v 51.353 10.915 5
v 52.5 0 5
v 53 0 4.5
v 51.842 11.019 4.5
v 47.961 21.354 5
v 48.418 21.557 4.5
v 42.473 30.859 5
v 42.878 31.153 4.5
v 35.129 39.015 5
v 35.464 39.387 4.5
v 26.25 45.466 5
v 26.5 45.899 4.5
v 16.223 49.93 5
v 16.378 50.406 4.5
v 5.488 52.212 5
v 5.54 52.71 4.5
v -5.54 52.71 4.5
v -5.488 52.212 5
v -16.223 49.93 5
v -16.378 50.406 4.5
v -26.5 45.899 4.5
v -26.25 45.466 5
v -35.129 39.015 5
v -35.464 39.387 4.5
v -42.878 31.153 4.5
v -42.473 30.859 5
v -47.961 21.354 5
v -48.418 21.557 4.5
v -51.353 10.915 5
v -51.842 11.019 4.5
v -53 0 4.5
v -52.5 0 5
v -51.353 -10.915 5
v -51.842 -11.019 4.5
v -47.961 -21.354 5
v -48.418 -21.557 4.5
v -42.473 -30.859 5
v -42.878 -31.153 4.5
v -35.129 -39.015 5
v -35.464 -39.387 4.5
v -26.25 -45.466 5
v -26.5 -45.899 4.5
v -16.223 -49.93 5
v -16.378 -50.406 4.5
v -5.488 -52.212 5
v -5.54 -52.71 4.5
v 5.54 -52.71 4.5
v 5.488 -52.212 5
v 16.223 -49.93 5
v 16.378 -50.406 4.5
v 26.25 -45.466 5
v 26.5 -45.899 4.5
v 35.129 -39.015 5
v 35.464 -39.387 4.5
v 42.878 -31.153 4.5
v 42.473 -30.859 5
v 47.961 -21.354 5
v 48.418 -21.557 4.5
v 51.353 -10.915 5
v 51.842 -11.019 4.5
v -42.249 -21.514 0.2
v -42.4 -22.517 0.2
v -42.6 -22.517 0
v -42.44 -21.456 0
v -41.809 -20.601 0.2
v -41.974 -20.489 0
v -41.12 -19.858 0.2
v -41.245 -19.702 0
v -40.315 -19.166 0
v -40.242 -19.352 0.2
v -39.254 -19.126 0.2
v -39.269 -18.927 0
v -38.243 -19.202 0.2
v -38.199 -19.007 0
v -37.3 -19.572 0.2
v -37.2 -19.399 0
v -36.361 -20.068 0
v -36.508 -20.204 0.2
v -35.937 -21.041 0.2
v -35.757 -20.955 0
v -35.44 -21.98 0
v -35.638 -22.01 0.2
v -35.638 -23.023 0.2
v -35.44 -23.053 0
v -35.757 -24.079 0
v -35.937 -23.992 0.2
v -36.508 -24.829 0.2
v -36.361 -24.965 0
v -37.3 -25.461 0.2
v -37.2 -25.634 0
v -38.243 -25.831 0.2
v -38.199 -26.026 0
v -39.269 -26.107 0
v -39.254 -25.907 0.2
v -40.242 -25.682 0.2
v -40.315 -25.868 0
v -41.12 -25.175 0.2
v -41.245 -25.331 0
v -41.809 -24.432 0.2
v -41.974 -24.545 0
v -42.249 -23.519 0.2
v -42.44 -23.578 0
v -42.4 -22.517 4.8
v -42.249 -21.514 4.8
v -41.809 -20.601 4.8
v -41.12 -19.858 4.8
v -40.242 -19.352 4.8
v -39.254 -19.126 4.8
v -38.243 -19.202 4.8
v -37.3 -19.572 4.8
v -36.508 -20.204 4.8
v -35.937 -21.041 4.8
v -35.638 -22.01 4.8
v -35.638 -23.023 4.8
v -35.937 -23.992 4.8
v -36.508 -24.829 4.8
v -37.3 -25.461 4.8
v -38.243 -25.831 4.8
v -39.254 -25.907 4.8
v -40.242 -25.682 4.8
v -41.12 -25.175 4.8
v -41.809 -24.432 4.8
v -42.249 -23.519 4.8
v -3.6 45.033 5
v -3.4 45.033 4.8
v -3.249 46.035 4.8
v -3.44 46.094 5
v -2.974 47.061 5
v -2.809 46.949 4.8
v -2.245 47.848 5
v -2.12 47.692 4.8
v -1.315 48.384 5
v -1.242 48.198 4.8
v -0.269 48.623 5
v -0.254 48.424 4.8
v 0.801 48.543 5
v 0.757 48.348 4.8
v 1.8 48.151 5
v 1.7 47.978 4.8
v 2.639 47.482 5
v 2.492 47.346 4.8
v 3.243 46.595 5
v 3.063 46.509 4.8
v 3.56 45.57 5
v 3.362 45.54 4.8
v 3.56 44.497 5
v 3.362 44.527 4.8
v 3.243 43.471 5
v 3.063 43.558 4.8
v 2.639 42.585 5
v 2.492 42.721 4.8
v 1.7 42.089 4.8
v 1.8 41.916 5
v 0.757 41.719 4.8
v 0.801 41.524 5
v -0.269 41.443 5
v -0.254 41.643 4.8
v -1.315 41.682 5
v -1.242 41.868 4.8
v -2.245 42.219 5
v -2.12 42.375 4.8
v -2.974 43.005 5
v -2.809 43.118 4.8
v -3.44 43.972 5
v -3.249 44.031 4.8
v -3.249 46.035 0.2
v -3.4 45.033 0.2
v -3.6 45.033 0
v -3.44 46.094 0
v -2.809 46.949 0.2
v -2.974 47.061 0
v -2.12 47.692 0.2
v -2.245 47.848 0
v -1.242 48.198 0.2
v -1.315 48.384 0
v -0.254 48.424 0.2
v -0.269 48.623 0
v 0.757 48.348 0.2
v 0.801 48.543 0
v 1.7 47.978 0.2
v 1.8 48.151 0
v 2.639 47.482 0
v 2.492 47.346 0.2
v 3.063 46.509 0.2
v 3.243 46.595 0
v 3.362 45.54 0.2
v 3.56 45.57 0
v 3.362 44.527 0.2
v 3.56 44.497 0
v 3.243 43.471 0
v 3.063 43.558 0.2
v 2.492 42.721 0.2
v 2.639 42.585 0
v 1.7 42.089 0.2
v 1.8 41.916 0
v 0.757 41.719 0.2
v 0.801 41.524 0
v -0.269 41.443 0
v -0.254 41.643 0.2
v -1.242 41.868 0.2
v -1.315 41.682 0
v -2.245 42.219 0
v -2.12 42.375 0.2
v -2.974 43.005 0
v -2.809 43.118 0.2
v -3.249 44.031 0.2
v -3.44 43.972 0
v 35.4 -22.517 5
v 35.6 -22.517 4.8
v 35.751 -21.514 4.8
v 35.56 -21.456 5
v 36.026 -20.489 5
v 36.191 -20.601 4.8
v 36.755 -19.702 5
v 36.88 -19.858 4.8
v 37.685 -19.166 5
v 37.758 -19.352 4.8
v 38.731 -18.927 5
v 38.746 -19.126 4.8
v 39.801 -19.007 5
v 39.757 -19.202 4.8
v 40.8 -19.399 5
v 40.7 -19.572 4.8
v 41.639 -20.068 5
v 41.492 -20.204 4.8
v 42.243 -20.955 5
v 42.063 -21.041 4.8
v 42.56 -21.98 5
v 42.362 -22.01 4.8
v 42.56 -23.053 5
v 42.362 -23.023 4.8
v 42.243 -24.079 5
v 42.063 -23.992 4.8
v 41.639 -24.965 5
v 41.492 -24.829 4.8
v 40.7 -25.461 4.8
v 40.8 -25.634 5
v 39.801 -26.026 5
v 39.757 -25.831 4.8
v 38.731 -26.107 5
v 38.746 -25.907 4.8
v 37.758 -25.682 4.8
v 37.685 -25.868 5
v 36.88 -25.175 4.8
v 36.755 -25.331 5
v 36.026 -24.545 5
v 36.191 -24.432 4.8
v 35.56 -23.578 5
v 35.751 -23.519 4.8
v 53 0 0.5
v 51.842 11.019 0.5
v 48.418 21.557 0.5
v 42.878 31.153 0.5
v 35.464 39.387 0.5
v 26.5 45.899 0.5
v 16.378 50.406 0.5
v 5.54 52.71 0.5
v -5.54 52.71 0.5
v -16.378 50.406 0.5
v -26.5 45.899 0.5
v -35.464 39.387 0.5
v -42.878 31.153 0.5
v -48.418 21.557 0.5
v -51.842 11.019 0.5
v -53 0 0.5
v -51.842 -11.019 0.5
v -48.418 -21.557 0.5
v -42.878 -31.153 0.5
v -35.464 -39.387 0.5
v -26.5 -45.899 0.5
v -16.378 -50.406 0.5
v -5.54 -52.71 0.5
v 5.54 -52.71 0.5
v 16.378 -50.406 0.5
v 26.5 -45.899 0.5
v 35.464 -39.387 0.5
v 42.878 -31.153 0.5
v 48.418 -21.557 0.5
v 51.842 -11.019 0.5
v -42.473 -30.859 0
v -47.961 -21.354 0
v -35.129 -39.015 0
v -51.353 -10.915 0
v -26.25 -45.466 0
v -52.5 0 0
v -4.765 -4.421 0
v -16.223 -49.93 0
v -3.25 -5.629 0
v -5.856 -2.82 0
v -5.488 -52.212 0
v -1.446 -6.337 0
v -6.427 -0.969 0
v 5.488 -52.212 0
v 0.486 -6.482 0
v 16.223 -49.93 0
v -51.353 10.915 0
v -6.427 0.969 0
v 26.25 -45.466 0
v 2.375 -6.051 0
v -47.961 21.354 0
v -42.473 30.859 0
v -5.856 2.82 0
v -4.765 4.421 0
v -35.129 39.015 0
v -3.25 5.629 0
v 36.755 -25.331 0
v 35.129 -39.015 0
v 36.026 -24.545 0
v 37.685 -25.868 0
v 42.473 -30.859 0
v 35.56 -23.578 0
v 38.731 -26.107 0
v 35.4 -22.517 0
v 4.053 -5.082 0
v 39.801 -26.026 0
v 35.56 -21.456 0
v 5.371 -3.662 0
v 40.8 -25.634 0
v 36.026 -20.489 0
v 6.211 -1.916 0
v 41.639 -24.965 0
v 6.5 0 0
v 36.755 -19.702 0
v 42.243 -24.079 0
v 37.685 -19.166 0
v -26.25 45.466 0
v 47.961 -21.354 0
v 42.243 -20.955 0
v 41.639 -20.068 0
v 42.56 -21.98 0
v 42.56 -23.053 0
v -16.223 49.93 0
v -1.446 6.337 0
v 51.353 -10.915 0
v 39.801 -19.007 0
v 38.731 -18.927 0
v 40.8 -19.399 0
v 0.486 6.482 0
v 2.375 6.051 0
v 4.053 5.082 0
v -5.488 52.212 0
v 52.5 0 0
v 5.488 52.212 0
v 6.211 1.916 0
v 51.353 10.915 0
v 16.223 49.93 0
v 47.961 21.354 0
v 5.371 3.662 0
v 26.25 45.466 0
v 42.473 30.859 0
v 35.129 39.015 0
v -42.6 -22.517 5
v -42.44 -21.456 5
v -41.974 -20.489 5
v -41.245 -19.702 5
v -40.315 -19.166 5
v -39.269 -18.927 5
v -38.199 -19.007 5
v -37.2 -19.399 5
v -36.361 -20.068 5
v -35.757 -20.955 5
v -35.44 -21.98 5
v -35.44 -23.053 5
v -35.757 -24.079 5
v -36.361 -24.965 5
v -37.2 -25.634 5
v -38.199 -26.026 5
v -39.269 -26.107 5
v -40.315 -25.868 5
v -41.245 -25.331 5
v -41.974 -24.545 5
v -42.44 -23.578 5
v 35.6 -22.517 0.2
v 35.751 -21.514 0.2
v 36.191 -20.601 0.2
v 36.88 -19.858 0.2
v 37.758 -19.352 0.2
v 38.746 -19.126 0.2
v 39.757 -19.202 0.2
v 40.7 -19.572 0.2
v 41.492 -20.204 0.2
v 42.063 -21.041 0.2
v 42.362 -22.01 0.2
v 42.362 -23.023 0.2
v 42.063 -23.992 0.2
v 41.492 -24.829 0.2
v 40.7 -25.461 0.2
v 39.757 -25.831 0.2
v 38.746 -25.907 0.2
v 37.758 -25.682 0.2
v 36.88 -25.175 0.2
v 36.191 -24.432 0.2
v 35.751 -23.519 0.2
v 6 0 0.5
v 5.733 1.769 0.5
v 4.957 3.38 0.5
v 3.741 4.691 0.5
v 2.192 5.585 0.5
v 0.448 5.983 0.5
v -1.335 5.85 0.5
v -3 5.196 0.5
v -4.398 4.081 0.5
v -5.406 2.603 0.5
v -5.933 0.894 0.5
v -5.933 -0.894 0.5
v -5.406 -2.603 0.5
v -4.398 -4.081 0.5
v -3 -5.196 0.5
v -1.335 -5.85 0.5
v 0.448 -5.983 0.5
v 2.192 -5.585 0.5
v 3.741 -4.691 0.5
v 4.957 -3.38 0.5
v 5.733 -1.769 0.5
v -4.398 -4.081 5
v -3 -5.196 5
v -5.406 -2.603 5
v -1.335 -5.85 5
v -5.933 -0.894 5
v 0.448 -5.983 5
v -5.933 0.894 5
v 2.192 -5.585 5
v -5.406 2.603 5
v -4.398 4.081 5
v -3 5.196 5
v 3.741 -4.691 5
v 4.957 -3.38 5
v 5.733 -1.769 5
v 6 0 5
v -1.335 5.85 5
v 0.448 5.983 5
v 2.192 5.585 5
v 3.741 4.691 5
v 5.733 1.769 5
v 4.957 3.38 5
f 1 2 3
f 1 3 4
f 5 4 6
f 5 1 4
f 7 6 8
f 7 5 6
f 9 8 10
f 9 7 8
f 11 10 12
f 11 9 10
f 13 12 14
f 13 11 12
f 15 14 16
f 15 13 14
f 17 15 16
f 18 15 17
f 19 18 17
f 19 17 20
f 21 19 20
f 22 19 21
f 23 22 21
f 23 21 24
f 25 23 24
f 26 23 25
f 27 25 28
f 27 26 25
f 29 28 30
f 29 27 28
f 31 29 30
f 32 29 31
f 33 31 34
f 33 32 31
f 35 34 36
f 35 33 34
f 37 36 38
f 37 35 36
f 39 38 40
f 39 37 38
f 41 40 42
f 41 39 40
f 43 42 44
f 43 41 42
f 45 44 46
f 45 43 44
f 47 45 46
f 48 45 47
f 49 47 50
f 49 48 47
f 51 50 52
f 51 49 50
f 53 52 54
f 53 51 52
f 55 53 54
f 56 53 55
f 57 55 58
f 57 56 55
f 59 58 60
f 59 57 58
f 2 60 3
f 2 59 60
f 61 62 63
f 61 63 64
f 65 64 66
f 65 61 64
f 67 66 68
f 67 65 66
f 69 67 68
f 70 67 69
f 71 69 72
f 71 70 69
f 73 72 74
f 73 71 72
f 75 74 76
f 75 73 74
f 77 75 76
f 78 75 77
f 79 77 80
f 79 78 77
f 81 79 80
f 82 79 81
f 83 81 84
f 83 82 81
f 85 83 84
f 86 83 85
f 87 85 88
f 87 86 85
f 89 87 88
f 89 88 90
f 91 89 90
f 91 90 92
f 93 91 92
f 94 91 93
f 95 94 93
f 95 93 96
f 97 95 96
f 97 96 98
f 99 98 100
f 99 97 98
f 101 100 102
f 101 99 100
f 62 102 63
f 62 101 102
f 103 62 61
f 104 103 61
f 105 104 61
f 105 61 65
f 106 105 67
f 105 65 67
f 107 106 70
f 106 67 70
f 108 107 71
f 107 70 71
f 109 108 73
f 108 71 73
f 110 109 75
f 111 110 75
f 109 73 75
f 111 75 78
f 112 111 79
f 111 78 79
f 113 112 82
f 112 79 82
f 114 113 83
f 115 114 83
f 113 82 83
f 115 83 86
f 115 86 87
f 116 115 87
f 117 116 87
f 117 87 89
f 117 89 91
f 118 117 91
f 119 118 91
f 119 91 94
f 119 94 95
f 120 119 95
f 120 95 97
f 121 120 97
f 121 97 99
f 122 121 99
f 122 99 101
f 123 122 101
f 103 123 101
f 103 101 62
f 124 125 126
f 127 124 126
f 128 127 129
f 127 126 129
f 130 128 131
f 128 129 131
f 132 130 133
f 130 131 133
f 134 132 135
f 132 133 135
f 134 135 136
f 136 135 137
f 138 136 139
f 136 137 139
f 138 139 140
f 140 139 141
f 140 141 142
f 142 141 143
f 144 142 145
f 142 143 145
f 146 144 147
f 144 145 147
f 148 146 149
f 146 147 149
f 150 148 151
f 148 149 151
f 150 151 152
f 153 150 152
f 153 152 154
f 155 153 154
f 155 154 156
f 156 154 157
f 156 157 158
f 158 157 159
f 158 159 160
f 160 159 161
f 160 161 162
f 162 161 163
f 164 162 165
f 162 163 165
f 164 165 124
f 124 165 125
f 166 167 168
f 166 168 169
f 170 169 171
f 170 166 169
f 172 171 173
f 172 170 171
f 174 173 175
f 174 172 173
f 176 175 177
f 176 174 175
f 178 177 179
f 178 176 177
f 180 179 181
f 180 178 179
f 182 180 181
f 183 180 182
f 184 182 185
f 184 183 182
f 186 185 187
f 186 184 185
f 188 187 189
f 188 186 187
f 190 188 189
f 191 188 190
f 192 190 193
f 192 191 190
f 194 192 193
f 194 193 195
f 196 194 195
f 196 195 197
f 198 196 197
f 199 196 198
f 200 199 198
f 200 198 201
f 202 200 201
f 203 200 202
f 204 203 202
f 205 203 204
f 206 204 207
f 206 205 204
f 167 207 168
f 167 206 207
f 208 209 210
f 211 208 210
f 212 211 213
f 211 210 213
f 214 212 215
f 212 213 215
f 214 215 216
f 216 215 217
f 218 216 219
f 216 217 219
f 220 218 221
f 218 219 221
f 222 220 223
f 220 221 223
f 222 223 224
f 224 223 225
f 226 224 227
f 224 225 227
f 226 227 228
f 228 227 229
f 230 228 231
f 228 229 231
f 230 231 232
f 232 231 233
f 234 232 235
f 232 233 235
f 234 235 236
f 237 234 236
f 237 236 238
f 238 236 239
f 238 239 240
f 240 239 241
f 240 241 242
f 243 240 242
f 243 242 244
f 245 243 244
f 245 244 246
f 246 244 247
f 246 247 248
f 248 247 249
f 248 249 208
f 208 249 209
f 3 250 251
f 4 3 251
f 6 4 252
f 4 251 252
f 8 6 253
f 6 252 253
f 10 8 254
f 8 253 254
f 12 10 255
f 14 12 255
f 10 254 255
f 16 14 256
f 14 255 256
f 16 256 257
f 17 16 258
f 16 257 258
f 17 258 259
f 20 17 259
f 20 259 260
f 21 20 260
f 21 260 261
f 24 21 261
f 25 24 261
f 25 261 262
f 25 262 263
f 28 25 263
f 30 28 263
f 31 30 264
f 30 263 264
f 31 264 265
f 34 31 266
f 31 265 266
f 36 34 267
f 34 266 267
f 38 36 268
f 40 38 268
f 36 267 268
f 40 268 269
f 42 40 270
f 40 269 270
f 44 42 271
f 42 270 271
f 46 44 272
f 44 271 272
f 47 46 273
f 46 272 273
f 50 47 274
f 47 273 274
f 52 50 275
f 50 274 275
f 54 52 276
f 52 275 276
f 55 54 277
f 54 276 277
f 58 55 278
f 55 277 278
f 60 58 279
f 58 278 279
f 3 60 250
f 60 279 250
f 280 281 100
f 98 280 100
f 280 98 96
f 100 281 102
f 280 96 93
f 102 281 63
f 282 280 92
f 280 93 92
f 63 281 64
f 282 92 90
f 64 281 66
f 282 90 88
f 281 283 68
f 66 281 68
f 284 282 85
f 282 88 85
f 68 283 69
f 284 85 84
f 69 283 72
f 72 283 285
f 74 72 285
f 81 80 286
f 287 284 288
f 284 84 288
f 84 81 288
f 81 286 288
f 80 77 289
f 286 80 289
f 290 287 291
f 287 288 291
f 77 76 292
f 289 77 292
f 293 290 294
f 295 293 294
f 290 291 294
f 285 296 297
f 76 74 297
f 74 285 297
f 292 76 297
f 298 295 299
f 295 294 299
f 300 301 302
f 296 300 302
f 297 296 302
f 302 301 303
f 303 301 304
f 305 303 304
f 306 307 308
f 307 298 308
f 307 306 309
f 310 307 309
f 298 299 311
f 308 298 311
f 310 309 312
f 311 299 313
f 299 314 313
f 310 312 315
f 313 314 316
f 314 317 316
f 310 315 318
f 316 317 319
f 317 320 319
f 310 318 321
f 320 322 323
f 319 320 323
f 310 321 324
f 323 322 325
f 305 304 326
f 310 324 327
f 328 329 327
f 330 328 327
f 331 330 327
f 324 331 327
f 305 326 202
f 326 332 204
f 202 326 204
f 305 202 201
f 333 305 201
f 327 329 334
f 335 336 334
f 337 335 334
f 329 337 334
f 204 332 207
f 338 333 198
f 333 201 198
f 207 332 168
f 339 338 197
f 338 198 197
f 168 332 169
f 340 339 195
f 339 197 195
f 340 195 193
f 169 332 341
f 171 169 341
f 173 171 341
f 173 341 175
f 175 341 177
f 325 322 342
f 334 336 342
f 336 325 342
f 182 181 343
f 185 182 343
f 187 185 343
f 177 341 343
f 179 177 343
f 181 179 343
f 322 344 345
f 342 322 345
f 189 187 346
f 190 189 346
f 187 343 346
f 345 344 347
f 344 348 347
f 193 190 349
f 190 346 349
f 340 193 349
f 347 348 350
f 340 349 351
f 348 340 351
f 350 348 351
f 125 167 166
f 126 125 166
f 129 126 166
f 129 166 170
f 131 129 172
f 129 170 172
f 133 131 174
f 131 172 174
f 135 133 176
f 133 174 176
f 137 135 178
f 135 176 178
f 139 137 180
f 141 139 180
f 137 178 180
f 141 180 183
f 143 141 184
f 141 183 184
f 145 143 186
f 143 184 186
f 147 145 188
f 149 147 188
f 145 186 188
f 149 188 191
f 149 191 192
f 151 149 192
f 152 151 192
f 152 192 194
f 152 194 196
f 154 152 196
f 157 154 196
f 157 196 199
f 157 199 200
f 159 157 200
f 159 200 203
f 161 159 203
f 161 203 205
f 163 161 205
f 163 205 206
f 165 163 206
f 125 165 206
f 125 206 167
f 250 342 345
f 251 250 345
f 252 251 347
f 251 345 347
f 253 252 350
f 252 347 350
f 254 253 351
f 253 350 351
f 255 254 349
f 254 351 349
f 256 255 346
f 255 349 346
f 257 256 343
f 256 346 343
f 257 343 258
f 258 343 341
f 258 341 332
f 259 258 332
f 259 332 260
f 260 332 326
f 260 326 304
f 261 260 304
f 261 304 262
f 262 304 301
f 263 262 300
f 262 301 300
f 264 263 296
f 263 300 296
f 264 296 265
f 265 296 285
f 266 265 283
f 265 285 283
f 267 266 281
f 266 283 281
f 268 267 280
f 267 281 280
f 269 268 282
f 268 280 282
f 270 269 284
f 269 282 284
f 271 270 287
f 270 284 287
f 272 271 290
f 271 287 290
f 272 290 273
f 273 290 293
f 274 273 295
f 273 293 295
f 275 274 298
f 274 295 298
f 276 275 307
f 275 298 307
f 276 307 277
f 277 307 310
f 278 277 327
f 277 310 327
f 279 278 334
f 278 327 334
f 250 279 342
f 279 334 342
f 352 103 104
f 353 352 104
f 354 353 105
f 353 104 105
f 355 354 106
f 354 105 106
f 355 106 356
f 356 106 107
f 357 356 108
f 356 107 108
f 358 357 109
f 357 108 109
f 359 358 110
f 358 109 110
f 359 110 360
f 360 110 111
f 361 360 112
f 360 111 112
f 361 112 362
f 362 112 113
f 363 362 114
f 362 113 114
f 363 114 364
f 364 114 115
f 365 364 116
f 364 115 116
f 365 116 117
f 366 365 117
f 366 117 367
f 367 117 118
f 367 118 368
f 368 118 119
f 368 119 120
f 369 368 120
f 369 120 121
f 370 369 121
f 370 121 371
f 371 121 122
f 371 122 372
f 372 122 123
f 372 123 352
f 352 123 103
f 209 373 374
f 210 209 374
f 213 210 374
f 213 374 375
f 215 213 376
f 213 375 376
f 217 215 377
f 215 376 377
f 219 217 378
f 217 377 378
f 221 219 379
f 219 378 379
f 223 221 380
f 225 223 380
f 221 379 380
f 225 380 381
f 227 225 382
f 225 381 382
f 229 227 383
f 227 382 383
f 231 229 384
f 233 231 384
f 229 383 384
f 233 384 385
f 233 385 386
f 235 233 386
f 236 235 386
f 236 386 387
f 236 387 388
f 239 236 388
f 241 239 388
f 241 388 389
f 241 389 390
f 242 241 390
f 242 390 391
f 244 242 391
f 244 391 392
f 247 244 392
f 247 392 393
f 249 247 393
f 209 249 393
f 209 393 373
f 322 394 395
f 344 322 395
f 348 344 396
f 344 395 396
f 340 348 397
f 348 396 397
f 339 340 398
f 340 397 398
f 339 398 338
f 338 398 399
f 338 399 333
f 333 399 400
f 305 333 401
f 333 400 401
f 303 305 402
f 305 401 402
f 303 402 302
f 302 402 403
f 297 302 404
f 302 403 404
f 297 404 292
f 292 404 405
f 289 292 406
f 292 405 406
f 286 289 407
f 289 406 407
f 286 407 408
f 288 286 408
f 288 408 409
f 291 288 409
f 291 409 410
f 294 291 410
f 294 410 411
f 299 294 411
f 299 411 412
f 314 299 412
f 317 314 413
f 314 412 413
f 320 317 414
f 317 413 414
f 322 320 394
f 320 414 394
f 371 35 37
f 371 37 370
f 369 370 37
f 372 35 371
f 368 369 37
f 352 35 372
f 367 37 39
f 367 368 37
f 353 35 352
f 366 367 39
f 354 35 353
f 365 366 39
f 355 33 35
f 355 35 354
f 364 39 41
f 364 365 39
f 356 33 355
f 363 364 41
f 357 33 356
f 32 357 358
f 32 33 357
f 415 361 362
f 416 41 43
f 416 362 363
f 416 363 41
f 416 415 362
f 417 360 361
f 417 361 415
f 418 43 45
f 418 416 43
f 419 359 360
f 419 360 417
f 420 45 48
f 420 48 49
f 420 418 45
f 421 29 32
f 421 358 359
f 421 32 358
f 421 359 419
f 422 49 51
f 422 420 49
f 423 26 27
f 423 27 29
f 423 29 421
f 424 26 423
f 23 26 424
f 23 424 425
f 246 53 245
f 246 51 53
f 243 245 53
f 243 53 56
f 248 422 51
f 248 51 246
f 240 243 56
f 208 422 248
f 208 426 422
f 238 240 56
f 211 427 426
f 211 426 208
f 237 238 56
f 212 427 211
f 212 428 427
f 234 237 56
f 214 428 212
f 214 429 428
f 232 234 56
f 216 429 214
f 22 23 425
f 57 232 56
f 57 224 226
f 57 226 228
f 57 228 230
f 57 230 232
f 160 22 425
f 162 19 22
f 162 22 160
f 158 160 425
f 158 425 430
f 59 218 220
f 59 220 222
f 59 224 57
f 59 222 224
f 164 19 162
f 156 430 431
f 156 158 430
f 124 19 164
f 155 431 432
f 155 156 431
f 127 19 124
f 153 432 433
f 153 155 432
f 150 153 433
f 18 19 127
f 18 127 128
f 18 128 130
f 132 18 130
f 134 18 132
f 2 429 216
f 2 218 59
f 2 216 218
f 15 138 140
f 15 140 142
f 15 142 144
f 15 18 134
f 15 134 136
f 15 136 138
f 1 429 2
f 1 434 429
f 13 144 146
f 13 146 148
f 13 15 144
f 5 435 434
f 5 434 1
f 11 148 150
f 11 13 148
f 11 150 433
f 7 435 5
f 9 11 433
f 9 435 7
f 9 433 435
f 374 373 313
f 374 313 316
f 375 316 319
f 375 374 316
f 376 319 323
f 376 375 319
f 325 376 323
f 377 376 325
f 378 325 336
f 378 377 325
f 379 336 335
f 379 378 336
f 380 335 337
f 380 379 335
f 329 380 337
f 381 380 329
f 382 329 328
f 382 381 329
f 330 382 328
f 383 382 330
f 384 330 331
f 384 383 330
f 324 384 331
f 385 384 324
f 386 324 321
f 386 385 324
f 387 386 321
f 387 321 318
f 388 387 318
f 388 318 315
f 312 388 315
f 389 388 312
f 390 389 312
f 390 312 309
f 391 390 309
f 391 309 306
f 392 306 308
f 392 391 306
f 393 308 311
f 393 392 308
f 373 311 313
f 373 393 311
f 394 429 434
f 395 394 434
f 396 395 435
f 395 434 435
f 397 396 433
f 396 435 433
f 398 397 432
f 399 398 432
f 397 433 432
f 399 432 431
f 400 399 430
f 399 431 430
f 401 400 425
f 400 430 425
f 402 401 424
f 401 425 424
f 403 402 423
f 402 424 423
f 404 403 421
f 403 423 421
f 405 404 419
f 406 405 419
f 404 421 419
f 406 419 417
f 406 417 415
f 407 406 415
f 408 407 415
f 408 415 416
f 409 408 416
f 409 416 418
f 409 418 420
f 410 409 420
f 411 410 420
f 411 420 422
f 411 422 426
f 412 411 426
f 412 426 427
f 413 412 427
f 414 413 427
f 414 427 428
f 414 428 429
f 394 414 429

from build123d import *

# Parameters (mm, degrees)
ESQUISSE1_R                               = 53
BOSS_EXTRU_1_DEPTH                        = 5
CHANFREIN1_SIZE                           = 0.5
TROU_POUR_TARAUDAGE_POUR_TROU_TARAUD_M8_D = 6.8
CHANFREIN2_SIZE                           = 0.2
ESQUISSE4_R                               = 6
ENL_V_MAT_EXTRU_1_DEPTH                   = 76.119904153
CHANFREIN3_SIZE                           = 0.5


with BuildPart() as part:
    # Esquisse1 → Boss.-Extru.1 (new body)
    with BuildSketch(Plane.XY):
        Circle(ESQUISSE1_R)
    extrude(amount=BOSS_EXTRU_1_DEPTH)

    # Chanfrein1
    chanfrein1_edges = [part.edges().sort_by_distance(p)[0] for p in [
        (-53, 0, 0),
        (-53, 0, 5),
    ]]
    chamfer(chanfrein1_edges, length=CHANFREIN1_SIZE)

    # Trou pour taraudage pour trou taraudé M81 (through all)
    with Locations(Plane.XY.offset(5)):
        with Locations((0, 45.033320997), (39, -22.516660498), (-39, -22.516660498)):
            Hole(TROU_POUR_TARAUDAGE_POUR_TROU_TARAUD_M8_D / 2)

    # Chanfrein2
    chanfrein2_edges = [part.edges().sort_by_distance(p)[0] for p in [
        (-35.6, -22.516660498, 5),
        (-35.6, -22.516660498, 0),
        (42.4, -22.516660498, 5),
        (42.4, -22.516660498, 0),
        (3.4, 45.033320997, 5),
        (3.4, 45.033320997, 0),
    ]]
    chamfer(chanfrein2_edges, length=CHANFREIN2_SIZE)

    # Esquisse4 → Enlèv. mat.-Extru.1 (cut, through all)
    with BuildSketch(Plane.XY.offset(5)):
        Circle(ESQUISSE4_R)
    extrude(amount=-ENL_V_MAT_EXTRU_1_DEPTH, mode=Mode.SUBTRACT)

    # Chanfrein3
    chanfrein3_edges = [part.edges().sort_by_distance(p)[0] for p in [
        (-6, 0, 0),
    ]]
    chamfer(chanfrein3_edges, length=CHANFREIN3_SIZE)


solid = part.part
